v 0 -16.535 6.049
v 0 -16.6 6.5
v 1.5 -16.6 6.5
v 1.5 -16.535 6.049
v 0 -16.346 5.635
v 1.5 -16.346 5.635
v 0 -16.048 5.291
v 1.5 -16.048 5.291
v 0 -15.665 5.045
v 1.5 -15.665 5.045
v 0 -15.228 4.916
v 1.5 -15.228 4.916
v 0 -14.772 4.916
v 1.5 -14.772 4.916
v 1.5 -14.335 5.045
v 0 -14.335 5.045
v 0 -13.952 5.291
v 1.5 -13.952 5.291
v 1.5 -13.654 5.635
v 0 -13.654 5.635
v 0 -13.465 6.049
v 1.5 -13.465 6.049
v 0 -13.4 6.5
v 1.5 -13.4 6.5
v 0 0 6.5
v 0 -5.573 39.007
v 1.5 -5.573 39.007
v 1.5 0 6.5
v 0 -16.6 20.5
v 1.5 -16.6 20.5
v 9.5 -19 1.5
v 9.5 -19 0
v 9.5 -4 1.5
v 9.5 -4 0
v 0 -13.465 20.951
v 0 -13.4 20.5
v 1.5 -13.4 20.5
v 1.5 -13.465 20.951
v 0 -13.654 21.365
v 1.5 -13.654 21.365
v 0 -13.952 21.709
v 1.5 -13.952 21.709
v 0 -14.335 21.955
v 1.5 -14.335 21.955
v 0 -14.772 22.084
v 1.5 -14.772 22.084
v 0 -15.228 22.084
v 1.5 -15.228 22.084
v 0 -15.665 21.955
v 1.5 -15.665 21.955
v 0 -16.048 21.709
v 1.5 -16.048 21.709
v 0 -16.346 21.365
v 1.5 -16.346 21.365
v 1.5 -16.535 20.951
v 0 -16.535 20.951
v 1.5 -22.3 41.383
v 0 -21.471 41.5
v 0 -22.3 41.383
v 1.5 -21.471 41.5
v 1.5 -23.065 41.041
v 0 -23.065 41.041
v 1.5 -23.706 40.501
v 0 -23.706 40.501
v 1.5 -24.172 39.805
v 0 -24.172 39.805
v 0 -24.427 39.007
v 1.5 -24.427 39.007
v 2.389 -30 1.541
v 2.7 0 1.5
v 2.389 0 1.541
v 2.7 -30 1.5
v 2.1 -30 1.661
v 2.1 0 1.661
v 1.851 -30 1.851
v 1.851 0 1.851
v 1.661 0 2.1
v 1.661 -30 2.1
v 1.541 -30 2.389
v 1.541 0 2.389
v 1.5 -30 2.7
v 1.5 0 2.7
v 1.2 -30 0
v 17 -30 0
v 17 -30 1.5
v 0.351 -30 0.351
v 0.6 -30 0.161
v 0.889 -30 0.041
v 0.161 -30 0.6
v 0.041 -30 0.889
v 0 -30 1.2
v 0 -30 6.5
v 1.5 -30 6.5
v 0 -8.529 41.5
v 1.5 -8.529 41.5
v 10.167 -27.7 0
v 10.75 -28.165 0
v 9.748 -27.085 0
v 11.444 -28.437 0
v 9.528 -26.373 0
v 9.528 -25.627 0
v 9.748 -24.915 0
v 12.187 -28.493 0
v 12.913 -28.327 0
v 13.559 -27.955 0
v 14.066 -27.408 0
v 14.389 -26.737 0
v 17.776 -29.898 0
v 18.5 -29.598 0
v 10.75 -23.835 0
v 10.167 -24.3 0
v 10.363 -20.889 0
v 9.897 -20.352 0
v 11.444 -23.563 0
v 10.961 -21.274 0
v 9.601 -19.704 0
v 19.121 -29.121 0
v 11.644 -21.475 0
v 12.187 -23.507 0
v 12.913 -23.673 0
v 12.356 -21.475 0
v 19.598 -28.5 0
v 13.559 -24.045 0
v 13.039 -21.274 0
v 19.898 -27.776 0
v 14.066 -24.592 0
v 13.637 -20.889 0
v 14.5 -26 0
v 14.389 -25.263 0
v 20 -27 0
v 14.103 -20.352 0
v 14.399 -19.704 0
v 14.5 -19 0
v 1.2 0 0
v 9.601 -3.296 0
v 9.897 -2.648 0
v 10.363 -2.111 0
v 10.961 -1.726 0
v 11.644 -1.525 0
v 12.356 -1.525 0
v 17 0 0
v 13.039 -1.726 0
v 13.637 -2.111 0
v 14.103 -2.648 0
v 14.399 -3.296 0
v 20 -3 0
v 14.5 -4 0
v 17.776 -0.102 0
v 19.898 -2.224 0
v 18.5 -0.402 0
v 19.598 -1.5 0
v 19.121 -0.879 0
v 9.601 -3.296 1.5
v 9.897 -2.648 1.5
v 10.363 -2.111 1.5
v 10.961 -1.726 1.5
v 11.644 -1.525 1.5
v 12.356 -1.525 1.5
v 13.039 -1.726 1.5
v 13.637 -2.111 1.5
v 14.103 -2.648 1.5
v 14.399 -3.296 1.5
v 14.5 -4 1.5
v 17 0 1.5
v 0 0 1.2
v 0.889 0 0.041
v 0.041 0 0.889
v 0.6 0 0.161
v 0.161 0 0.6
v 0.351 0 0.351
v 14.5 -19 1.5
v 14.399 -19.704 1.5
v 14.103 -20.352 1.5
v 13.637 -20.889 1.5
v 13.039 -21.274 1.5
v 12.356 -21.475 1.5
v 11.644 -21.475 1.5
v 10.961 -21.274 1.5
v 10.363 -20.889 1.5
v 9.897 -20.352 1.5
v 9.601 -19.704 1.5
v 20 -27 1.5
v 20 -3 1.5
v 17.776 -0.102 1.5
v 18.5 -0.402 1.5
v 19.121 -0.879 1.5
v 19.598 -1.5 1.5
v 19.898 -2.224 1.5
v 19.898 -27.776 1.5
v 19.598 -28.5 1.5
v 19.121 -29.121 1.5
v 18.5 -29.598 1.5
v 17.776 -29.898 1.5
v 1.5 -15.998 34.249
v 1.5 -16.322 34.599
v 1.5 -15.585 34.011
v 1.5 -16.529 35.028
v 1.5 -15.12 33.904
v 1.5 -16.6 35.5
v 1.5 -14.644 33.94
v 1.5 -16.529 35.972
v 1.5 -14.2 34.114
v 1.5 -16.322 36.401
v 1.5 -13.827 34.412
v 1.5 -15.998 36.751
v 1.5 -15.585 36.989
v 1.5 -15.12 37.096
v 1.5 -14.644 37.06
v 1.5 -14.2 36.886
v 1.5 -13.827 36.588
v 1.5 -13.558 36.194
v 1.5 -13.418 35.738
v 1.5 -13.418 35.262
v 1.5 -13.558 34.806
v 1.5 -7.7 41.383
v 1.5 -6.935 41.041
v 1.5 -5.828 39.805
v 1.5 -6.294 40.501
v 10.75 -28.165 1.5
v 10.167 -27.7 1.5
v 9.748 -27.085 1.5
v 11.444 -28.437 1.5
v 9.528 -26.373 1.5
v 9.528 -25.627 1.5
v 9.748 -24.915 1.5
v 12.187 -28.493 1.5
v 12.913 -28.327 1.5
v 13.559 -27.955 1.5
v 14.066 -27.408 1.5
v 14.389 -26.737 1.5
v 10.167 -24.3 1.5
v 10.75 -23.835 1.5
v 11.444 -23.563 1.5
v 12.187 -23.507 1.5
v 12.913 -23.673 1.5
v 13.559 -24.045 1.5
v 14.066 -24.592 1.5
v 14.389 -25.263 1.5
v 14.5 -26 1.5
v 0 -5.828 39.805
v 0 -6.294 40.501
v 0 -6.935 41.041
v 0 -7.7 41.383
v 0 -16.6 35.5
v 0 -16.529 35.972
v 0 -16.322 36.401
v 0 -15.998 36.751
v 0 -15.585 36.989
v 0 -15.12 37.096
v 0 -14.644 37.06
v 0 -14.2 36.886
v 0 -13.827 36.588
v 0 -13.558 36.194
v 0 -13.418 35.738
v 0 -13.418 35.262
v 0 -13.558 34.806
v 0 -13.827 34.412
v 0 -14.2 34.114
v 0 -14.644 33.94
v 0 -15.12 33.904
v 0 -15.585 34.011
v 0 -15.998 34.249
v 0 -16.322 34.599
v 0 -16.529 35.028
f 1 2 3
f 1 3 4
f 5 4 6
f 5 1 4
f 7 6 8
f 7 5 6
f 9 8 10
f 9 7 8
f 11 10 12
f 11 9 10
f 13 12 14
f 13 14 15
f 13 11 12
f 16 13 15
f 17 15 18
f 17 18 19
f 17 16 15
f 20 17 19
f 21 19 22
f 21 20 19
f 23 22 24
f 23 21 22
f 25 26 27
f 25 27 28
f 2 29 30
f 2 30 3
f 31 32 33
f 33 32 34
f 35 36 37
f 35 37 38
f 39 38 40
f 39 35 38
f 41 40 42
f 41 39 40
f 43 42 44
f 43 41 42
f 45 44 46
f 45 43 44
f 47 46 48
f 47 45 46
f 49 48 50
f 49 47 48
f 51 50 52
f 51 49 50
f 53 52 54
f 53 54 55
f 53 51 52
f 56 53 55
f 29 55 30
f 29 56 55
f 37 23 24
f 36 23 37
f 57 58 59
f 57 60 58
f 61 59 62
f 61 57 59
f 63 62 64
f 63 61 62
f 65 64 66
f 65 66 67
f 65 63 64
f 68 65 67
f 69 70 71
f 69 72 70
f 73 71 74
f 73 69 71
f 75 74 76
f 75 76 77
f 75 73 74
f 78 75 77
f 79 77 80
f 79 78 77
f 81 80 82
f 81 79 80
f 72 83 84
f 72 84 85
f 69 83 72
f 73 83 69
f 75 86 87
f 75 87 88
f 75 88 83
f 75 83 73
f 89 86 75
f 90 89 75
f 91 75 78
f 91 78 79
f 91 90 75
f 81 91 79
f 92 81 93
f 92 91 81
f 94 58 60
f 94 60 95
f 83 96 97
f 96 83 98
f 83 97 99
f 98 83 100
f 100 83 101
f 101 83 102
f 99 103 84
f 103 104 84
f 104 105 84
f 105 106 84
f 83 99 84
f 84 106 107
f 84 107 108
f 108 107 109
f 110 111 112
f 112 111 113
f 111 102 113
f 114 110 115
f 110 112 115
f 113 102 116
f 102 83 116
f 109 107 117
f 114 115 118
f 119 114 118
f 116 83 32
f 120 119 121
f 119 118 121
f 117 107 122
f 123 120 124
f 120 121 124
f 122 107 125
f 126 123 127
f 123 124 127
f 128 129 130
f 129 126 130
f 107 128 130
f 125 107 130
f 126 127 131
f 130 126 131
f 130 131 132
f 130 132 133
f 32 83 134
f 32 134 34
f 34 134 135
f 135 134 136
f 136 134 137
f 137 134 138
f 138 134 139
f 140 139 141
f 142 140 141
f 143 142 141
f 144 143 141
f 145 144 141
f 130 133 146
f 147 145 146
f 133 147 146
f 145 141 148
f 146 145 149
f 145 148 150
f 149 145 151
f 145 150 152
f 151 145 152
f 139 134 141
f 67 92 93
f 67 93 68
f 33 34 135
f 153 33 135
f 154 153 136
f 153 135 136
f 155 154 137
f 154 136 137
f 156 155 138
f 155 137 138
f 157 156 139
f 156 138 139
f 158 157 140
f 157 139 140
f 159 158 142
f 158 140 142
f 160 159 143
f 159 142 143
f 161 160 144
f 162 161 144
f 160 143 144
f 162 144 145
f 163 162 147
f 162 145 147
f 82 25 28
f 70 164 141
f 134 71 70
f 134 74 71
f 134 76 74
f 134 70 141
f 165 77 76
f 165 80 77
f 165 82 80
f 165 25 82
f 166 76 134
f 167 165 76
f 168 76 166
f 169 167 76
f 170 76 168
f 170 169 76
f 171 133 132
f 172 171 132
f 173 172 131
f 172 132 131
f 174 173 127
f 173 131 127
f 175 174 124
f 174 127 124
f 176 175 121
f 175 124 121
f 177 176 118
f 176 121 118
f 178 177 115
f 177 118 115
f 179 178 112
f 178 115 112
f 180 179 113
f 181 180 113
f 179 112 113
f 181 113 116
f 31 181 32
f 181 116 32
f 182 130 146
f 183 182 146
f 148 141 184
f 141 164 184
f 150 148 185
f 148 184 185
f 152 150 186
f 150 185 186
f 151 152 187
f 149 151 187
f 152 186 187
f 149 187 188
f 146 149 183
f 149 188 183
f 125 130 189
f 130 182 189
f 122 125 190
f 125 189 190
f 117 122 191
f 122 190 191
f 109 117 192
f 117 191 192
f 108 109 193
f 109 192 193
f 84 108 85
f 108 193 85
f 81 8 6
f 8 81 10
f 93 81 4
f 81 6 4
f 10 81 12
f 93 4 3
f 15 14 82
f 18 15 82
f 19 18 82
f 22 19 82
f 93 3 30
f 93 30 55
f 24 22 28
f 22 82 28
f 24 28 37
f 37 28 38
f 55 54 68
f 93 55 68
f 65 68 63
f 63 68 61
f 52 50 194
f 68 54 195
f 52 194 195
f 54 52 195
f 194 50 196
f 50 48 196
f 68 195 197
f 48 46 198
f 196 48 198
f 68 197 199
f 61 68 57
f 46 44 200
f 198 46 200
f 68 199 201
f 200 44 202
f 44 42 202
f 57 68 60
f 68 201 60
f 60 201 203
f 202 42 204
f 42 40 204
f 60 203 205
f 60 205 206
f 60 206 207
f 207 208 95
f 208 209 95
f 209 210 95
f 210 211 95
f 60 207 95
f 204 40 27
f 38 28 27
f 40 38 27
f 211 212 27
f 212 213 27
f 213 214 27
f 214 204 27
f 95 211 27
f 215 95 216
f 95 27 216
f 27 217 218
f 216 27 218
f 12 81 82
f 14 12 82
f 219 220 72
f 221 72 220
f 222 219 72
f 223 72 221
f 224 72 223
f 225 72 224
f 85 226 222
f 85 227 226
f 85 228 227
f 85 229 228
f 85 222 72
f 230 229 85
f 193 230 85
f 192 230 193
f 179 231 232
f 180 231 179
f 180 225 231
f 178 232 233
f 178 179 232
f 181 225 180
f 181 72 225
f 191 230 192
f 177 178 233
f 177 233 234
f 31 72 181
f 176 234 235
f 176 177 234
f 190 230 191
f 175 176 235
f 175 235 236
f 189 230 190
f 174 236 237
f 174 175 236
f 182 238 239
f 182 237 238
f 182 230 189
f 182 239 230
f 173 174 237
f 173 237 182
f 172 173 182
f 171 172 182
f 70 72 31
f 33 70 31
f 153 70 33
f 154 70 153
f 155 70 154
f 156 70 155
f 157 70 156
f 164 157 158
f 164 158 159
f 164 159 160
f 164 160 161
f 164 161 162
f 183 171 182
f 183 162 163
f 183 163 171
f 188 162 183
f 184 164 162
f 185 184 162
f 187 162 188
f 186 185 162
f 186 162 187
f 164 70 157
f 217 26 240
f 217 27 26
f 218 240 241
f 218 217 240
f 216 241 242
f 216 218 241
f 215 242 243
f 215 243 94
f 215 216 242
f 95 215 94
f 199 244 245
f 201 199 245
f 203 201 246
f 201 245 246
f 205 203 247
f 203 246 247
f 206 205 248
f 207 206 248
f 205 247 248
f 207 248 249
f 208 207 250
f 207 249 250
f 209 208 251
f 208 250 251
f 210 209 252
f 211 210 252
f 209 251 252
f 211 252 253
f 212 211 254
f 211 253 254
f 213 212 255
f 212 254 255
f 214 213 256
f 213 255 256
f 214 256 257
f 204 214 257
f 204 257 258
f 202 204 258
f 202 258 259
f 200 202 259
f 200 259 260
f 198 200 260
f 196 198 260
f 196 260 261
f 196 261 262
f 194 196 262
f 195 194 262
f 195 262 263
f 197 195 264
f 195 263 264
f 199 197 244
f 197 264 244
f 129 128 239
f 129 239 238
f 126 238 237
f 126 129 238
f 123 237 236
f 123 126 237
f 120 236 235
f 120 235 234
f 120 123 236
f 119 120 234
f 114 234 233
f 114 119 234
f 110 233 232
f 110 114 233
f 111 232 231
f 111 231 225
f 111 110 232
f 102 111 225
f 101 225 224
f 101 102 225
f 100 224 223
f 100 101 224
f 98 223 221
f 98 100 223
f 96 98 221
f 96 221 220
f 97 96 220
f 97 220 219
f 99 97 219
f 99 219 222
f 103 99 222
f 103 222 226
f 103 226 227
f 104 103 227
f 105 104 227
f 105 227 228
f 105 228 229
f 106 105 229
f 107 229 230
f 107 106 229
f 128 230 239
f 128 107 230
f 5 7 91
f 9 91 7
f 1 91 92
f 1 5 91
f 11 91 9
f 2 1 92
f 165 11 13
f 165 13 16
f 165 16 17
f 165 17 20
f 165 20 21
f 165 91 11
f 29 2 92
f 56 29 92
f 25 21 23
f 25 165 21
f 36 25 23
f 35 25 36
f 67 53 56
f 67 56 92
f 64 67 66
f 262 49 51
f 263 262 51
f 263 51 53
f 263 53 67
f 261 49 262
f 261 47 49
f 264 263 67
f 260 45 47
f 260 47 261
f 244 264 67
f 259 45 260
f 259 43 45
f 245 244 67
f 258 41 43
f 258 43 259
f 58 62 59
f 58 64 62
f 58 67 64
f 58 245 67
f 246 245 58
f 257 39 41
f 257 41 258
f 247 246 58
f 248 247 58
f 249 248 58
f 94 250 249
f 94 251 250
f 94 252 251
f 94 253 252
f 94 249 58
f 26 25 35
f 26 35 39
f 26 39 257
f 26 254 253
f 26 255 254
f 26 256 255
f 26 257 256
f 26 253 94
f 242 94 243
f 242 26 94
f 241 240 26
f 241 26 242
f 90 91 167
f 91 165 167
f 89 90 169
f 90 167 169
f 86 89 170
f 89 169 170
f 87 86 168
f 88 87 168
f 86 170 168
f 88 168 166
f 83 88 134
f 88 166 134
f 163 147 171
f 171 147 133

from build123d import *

# Parameters (mm, degrees)
SKETCH1_W           = 20
SKETCH1_H           = 30
SKETCH1_R           = 2.5
BOSS_EXTRUDE1_DEPTH = 1.5
SKETCH3_R           = 1.6
BOSS_EXTRUDE2_DEPTH = 1.5
FILLET1_R           = 1.2
FILLET2_R           = 3


with BuildPart() as part:
    # Sketch1 → Boss-Extrude1 (new body)
    with BuildSketch(Plane.XY):
        with Locations((10, -15)):
            Rectangle(SKETCH1_W, SKETCH1_H)
        with Locations((12, -26)):
            Circle(SKETCH1_R, mode=Mode.SUBTRACT)
        with BuildLine():
            Line((14.5, -4), (14.5, -19))
            ThreePointArc((14.5, -19), (12, -21.5), (9.5, -19))
            Line((9.5, -19), (9.5, -4))
            ThreePointArc((9.5, -4), (12, -1.5), (14.5, -4))
        make_face(mode=Mode.SUBTRACT)
    extrude(amount=BOSS_EXTRUDE1_DEPTH)

    # Sketch3 → Boss-Extrude2 (add)
    with BuildSketch(Plane.ZY):
        Polygon((1.5, 0), (1.5, -30), (6.5, -30), (41.5, -24), (41.5, -6), (6.5, 0), align=None)
        with Locations(Location((35.5, -15, 0), (0, 0, 270))):
            Circle(SKETCH3_R, mode=Mode.SUBTRACT)
        with BuildLine():
            Line((6.5, -13.4), (20.5, -13.4))
            ThreePointArc((20.5, -13.4), (22.1, -15), (20.5, -16.6))
            Line((20.5, -16.6), (6.5, -16.6))
            ThreePointArc((6.5, -16.6), (4.9, -15), (6.5, -13.4))
        make_face(mode=Mode.SUBTRACT)
    extrude(amount=-BOSS_EXTRUDE2_DEPTH)

    # Fillet1
    fillet1_edges = [part.edges().sort_by_distance(p)[0] for p in [
        (1.5, -15, 1.5),
        (0, -15, 0),
    ]]
    fillet(fillet1_edges, radius=FILLET1_R)

    # Fillet2
    fillet2_edges = [part.edges().sort_by_distance(p)[0] for p in [
        (0.75, -6, 41.5),
        (0.75, -24, 41.5),
        (20, 0, 0.75),
        (20, -30, 0.75),
    ]]
    fillet(fillet2_edges, radius=FILLET2_R)


solid = part.part
